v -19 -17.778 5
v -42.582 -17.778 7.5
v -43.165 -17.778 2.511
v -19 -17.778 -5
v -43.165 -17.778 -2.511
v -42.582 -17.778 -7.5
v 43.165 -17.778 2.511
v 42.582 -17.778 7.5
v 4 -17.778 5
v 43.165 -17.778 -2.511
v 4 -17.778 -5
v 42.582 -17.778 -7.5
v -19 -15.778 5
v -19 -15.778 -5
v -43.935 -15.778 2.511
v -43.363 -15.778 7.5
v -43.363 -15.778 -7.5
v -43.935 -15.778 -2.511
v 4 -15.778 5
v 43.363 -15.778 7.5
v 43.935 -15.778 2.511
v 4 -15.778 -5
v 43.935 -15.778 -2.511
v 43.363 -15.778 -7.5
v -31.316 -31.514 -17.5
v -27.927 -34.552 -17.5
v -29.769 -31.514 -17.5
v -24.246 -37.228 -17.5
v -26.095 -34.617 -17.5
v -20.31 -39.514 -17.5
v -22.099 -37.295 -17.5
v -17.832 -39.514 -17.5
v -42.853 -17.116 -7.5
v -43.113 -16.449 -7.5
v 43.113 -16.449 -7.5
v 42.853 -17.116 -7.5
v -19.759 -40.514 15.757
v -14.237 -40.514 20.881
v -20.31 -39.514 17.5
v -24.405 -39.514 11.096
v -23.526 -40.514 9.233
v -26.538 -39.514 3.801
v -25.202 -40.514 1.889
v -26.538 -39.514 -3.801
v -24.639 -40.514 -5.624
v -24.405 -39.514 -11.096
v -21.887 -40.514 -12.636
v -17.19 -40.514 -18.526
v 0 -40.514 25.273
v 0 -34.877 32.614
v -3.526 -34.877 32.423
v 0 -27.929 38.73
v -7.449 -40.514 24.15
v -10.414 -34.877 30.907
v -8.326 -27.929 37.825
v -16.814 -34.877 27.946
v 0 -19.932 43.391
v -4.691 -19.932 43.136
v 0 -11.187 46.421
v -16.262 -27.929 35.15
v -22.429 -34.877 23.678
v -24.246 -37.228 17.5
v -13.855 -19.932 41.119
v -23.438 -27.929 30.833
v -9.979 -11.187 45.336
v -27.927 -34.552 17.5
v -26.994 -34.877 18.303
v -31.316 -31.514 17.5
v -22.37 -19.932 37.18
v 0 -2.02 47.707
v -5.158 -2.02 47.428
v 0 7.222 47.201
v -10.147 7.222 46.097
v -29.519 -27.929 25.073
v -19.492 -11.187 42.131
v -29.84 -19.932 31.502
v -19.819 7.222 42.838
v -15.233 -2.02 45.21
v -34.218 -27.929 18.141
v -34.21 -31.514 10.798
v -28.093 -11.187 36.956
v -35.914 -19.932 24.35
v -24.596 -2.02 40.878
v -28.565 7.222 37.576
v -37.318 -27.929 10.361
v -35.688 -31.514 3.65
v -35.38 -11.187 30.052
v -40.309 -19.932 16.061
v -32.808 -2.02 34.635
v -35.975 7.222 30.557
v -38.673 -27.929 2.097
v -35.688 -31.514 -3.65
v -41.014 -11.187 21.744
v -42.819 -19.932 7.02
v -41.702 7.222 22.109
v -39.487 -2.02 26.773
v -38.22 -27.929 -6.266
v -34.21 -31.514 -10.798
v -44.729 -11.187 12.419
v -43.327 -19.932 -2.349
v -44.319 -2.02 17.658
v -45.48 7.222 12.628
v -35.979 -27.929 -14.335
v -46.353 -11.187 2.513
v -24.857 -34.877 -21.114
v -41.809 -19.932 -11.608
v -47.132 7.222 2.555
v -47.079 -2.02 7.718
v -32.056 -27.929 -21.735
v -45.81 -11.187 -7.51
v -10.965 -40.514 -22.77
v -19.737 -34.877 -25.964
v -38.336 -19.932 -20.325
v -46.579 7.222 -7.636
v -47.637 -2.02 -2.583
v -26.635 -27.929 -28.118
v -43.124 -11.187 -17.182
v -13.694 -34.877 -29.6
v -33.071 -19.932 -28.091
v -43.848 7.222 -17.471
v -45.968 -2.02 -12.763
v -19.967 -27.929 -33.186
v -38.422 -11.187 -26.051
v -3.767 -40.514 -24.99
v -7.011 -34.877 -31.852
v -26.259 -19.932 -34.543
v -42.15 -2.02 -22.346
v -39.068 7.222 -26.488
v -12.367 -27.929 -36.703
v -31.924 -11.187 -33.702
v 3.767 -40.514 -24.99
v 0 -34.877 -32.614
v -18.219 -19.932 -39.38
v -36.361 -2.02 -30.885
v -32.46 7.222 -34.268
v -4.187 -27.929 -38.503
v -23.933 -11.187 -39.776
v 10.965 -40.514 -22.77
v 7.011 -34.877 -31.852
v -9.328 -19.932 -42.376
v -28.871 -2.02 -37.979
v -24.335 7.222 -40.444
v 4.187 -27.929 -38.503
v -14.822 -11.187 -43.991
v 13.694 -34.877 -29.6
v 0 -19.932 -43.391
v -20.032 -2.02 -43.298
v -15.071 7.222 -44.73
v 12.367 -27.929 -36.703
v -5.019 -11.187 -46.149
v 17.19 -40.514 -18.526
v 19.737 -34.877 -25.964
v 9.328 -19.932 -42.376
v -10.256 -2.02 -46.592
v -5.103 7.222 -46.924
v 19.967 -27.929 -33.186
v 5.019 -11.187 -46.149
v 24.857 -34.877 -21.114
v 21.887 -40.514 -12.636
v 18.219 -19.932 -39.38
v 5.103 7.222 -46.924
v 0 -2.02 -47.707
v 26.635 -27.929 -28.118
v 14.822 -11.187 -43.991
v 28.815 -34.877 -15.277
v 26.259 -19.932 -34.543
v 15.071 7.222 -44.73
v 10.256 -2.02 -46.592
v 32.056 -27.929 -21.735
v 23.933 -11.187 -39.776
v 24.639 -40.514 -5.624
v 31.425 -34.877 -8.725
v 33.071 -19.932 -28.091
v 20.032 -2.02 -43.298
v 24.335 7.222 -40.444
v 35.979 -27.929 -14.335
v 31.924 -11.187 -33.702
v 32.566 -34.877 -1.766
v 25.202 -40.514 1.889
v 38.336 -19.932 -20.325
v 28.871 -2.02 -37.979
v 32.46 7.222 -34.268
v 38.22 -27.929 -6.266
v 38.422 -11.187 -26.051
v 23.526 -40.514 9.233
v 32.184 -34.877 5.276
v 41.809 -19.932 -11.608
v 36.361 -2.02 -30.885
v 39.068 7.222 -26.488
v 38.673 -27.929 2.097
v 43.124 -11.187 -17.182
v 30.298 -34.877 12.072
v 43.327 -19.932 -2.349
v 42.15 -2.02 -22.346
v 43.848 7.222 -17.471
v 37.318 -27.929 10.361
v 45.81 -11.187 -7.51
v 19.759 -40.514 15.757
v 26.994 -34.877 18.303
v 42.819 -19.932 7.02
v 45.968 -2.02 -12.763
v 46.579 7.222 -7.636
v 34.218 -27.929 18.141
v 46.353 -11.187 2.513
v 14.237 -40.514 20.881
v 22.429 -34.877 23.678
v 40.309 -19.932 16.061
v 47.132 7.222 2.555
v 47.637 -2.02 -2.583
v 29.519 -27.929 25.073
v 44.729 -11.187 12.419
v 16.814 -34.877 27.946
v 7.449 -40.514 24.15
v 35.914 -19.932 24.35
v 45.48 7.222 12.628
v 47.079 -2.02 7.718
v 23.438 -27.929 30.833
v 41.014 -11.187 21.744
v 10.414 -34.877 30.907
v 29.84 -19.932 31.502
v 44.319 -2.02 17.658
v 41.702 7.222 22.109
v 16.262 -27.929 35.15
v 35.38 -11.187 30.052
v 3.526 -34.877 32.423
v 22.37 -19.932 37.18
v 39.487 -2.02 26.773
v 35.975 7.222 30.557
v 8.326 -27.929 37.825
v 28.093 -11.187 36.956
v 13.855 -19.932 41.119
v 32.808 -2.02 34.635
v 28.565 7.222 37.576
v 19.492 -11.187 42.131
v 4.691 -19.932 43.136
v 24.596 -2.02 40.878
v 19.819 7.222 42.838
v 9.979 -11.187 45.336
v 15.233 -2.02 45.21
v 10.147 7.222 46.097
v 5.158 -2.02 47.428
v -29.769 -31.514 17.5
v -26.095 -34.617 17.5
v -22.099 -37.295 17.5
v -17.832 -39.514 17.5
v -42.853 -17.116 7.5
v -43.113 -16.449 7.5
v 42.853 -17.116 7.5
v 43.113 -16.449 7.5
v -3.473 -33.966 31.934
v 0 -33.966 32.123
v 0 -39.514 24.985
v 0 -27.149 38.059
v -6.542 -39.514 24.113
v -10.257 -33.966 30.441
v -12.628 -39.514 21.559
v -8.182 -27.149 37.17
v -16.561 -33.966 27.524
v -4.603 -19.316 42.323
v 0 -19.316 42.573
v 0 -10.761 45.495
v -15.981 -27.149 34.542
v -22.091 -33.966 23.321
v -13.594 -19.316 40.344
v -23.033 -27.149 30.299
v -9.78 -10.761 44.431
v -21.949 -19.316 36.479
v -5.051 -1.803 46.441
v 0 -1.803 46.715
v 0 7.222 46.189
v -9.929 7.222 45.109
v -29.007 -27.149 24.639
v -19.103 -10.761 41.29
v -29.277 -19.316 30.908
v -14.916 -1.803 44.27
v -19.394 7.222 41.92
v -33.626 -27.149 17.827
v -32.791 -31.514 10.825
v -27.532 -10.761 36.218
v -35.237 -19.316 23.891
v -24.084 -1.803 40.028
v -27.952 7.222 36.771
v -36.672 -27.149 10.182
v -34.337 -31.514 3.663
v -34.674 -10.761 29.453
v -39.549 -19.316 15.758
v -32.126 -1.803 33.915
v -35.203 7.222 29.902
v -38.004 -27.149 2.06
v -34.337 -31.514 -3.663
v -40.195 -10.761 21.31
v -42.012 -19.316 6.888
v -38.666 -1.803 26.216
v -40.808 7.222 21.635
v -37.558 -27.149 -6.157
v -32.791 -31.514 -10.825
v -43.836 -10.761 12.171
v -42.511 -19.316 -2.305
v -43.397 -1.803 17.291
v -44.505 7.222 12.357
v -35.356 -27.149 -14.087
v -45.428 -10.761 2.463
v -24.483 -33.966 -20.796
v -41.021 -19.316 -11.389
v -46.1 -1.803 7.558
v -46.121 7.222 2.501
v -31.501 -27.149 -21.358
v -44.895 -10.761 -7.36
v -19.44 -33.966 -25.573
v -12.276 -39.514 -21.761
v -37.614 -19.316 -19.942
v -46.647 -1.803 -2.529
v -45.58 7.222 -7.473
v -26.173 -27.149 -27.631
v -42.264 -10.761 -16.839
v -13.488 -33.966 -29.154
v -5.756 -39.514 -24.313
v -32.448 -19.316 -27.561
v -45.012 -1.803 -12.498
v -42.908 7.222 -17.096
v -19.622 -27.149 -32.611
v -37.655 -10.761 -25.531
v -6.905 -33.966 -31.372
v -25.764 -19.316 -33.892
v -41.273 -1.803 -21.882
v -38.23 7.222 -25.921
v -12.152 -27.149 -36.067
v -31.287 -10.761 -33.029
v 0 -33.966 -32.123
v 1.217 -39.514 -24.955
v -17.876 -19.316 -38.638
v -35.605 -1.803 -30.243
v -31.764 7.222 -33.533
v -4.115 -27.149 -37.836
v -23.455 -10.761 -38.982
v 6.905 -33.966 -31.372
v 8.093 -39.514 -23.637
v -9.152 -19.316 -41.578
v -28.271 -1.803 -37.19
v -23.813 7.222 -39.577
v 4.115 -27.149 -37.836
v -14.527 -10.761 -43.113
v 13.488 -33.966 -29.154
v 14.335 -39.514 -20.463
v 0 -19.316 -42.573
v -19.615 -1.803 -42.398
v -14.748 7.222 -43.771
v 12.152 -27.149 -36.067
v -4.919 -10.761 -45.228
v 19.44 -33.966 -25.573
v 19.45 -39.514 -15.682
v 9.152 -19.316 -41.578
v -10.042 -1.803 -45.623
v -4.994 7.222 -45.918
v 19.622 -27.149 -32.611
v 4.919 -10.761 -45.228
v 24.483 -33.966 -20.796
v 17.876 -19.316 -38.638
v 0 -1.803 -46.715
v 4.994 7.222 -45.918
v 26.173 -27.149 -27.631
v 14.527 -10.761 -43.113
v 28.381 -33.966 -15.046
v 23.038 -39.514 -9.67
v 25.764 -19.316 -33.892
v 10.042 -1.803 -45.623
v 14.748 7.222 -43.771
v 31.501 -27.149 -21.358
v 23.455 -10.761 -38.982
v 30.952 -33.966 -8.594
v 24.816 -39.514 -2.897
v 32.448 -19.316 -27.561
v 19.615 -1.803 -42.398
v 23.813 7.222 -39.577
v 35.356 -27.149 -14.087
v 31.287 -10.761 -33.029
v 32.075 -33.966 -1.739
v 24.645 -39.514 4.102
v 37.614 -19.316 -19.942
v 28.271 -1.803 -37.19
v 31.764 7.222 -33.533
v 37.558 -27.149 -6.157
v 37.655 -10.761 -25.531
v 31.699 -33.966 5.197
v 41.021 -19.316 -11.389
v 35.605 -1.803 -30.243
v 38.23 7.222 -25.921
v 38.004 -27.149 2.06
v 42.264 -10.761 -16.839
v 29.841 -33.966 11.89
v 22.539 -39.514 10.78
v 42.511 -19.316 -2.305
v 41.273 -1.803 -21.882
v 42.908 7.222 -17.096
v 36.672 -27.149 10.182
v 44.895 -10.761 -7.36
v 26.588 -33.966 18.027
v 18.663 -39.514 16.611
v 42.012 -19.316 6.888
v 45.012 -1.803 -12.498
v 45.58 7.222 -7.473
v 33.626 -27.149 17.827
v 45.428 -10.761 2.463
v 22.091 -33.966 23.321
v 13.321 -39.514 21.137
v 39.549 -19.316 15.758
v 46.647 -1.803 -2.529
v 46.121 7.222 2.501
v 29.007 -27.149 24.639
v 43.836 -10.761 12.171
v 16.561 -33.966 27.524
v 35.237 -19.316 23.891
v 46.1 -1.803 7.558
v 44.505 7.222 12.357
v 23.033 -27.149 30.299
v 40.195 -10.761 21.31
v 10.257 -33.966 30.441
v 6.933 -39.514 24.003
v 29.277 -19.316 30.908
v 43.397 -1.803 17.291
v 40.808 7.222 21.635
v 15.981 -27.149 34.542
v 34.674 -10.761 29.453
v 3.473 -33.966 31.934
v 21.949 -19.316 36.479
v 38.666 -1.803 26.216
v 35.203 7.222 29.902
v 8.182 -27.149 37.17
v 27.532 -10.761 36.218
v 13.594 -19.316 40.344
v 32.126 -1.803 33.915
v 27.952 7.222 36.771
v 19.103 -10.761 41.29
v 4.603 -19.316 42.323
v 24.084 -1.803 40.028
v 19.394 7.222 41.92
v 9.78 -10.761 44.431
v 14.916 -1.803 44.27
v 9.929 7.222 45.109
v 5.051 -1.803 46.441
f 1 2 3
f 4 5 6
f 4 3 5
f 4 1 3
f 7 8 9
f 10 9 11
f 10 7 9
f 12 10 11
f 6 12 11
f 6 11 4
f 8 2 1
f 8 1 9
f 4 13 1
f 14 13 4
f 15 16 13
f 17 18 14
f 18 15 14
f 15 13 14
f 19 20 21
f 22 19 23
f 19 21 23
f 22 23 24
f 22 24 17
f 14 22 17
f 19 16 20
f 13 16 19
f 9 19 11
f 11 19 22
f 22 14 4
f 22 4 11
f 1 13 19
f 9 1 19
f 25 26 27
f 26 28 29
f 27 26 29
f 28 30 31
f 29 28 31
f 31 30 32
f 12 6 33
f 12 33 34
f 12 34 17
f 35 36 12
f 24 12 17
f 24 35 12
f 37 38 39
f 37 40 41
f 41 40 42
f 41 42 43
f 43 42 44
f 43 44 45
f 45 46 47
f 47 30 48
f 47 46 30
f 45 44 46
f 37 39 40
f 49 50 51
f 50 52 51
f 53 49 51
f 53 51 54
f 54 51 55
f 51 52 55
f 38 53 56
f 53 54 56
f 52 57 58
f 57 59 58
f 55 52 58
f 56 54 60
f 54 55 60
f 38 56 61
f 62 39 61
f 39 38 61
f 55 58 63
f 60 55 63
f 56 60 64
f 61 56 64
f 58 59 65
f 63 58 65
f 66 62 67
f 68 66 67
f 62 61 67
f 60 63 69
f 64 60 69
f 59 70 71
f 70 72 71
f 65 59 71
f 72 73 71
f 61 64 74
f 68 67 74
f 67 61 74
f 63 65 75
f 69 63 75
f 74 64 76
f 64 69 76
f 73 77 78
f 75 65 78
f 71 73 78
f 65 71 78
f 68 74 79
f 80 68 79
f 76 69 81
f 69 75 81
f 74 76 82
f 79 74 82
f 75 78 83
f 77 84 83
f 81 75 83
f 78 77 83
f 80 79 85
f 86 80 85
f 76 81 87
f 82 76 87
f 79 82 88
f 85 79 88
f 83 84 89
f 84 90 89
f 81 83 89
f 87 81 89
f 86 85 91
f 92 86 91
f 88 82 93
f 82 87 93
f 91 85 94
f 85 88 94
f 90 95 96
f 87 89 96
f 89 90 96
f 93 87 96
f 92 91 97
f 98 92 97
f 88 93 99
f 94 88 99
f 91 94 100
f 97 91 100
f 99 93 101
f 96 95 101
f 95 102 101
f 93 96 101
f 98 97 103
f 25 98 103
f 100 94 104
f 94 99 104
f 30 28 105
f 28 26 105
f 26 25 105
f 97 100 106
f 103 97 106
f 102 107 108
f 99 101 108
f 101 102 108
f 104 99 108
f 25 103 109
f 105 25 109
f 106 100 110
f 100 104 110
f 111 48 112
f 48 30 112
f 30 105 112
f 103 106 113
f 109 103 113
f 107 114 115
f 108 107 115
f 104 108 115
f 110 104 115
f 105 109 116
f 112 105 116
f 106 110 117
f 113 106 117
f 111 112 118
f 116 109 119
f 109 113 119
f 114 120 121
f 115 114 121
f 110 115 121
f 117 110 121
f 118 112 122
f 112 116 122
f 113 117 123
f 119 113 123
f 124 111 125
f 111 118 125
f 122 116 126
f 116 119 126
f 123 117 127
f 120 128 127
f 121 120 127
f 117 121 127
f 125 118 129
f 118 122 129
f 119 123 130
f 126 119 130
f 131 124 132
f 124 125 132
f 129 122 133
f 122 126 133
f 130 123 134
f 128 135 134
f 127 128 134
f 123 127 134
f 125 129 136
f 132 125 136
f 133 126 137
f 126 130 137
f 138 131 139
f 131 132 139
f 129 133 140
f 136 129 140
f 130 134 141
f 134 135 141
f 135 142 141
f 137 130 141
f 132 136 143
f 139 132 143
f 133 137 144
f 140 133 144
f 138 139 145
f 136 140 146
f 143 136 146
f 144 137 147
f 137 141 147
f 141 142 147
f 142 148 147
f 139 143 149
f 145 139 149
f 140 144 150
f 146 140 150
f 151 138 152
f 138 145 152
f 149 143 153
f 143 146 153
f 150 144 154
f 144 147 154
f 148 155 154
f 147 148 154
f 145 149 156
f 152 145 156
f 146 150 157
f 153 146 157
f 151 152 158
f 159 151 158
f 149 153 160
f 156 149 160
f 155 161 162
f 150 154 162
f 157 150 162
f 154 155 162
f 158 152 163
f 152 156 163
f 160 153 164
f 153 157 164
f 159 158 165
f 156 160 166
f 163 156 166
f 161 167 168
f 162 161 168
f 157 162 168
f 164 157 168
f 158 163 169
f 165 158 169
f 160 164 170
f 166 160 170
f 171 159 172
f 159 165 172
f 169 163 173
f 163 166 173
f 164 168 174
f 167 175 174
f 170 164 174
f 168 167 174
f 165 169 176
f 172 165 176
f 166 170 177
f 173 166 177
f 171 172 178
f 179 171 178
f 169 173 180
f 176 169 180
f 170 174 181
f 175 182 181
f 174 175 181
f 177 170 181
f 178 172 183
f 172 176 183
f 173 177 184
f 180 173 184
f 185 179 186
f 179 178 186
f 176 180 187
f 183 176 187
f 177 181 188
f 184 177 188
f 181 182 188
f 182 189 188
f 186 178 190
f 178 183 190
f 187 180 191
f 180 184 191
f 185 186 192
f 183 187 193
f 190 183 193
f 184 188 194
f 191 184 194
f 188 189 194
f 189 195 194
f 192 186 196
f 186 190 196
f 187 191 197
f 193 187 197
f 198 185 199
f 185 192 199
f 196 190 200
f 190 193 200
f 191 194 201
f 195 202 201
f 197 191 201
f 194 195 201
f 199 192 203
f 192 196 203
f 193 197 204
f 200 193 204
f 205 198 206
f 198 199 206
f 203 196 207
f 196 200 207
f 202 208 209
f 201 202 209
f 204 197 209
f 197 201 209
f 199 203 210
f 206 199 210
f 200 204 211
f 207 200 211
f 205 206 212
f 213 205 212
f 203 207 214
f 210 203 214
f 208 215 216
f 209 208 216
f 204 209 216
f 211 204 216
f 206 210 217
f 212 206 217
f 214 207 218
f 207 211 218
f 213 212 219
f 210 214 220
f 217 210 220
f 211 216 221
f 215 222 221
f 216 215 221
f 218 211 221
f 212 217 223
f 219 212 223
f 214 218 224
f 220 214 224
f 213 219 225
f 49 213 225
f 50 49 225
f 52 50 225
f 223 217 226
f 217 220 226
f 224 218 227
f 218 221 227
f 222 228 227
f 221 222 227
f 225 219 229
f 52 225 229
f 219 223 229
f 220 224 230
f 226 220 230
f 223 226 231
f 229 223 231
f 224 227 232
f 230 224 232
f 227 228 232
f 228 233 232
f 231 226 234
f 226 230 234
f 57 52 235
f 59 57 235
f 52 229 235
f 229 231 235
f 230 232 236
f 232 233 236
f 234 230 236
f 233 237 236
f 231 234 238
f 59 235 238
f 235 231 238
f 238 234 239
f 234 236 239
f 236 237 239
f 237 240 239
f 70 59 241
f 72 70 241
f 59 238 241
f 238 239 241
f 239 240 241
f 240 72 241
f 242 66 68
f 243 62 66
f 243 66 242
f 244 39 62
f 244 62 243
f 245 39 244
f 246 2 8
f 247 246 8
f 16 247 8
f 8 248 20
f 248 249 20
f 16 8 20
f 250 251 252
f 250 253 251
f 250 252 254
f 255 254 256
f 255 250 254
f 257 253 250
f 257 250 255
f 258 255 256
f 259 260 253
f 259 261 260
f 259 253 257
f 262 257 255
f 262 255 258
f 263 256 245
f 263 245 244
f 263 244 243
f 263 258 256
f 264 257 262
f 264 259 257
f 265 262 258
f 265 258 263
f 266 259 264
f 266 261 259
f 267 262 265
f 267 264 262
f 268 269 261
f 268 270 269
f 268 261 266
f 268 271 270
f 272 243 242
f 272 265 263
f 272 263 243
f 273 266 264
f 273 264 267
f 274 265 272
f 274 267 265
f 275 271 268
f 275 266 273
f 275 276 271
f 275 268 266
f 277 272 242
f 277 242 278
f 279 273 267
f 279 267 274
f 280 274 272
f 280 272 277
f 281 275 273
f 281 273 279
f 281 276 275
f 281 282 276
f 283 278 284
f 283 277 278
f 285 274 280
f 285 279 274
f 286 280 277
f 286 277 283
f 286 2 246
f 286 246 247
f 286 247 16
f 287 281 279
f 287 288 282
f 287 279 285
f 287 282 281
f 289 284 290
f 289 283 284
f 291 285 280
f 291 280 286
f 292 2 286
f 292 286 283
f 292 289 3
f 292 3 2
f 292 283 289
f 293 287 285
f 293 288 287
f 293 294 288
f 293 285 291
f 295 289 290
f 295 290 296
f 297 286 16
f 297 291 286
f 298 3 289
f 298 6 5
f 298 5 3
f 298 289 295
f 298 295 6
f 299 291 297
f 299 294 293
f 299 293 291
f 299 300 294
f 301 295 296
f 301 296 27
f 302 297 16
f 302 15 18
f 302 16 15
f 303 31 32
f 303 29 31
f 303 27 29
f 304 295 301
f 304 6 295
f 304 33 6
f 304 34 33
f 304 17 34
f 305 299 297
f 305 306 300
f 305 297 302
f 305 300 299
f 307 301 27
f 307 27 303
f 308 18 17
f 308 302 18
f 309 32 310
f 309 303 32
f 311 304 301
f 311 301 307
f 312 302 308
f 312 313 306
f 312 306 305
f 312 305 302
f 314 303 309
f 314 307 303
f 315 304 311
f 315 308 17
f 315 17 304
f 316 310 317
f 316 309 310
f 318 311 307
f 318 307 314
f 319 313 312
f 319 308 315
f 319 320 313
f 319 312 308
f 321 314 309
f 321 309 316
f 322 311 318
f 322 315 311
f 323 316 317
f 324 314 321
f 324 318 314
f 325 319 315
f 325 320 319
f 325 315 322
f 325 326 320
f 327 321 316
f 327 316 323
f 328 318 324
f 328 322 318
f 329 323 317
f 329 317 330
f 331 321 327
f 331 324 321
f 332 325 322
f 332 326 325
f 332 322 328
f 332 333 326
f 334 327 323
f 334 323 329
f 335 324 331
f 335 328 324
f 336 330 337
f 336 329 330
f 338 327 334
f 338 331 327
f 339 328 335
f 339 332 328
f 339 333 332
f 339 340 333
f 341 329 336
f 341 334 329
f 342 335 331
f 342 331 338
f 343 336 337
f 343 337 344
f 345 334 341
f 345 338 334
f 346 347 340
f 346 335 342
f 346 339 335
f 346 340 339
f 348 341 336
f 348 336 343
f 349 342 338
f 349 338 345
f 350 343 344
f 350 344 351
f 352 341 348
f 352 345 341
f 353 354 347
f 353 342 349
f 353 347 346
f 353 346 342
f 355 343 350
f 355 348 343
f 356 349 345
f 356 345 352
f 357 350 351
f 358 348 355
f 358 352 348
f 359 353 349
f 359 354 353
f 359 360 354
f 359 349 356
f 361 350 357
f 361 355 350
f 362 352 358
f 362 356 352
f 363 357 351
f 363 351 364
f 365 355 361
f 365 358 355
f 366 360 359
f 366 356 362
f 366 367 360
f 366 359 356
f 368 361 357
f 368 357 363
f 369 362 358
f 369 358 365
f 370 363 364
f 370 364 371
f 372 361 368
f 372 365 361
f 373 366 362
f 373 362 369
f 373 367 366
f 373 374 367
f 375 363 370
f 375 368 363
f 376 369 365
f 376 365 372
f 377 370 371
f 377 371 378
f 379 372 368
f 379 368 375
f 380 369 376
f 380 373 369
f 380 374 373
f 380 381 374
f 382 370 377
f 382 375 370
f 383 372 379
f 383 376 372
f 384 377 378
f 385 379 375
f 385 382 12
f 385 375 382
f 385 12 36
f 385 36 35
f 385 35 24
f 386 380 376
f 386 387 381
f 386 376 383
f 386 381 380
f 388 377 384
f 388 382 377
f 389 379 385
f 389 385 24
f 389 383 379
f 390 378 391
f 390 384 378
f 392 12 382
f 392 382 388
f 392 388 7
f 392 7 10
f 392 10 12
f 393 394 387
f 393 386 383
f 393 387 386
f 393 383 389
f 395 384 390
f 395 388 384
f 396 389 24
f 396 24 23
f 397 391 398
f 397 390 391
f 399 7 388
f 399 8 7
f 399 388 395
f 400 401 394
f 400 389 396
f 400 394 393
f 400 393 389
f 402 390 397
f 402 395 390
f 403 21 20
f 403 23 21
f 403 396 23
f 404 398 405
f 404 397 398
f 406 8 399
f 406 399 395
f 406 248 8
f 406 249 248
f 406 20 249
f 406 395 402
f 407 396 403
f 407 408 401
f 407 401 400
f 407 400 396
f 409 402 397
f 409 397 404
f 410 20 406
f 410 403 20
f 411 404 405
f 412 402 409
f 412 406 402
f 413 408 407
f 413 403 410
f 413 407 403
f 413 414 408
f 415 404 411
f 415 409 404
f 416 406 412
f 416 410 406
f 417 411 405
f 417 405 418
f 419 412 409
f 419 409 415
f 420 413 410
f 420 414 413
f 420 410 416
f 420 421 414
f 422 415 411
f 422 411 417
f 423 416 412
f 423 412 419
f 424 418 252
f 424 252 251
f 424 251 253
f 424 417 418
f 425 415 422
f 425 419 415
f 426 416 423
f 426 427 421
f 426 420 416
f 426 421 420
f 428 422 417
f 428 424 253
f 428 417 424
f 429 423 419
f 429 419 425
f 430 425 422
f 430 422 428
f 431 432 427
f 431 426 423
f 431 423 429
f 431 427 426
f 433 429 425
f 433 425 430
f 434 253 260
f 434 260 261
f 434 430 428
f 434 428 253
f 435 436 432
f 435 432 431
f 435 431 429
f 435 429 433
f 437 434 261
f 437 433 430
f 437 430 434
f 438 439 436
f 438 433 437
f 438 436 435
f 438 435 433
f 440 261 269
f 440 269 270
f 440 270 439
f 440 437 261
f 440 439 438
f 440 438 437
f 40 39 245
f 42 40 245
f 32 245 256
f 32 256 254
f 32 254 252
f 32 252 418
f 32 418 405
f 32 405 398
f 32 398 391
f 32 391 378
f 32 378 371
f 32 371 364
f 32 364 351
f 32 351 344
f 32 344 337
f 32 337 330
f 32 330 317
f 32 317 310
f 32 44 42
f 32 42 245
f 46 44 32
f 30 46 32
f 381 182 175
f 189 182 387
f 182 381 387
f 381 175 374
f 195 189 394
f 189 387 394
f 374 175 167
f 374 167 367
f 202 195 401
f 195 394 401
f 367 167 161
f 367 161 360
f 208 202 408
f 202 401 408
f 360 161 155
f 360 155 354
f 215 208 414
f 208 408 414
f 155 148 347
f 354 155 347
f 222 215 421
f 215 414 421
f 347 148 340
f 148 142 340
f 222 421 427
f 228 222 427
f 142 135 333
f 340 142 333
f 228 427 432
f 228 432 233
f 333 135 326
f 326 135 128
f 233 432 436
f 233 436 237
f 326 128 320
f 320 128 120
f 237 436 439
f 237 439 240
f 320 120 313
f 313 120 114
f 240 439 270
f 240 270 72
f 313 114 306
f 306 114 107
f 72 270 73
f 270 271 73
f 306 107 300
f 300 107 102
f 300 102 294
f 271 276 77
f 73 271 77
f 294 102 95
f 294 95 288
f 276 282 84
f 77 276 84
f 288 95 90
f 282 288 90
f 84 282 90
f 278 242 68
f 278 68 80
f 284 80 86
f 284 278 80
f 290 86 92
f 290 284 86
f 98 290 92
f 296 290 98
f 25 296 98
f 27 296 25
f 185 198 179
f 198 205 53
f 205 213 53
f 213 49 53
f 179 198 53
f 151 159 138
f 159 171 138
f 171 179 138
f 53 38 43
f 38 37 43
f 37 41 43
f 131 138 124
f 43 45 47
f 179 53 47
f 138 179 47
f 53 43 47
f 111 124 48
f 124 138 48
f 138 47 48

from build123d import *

# Parameters (mm, degrees)
SHELL_1_T            = -1
EXTRUDE_1_REACH      = 80.75
EXTRUDE_1_END_RADIUS = 46.75
SKETCH_2_W           = 15
SKETCH_2_H           = 2
EXTRUDE_2_REACH      = 80.75
SKETCH_4_W           = 15
SKETCH_4_H           = 2
SKETCH_5_W           = 23
SKETCH_5_H           = 10
CUT_EXTRUDE_1_DEPTH  = 10
SKETCH_6_W           = 35
SKETCH_6_H           = 8
CUT_EXTRUDE_2_DEPTH  = 47


with BuildPart() as part:
    # 草图1 → 旋转1 (revolve)
    with BuildSketch(Plane(origin=(0, 0, 0), x_dir=(0, 0, -1), z_dir=(1, 0, 0))):
        with BuildLine():
            Line((-47.200739576, 7.221681487), (0, 7.221681487))
            Line((0, 7.221681487), (0, -40.513710474))
            Line((0, -40.513710474), (-25.272549608, -40.513710474))
            ThreePointArc((-25.272549608, -40.513710474), (-43.390797673, -19.932415241), (-47.200739576, 7.221681487))
        make_face()
    revolve(axis=Axis((0, 7.221681487, 0), (0, -1, 0)))

    # 抽壳1
    shell_1_openings = [part.faces().sort_by_distance(p)[0] for p in [
        (0, 7.221681487, 0),
    ]]
    offset(amount=SHELL_1_T, openings=shell_1_openings, kind=Kind.INTERSECTION)

    # 凸台-拉伸1: up to this sphere (the profile starts inside it)
    extrude_1_end = Location((0, 0, 0)) * Sphere(EXTRUDE_1_END_RADIUS, mode=Mode.PRIVATE)
    # 草图2 → 凸台-拉伸1 (add, up to the surface)
    with BuildSketch(Plane(origin=(0, 0, 0), x_dir=(0, 0, -1), z_dir=(1, 0, 0)), mode=Mode.PRIVATE) as extrude_1_sk1:
        with Locations((0, -16.778318513)):
            Rectangle(SKETCH_2_W, SKETCH_2_H)
    extrude_1_tool1 = extrude(extrude_1_sk1.sketch, amount=EXTRUDE_1_REACH, mode=Mode.PRIVATE) & extrude_1_end
    add(extrude_1_tool1.solids().sort_by_distance((0, -16.778319, 0))[0])

    # 草图4 → 凸台-拉伸2 (add, up to next)
    with BuildSketch(Plane(origin=(0, 0, 0), x_dir=(0, 0, -1), z_dir=(1, 0, 0)), mode=Mode.PRIVATE) as extrude_2_sk1:
        with Locations((0, -16.778318513)):
            Rectangle(SKETCH_4_W, SKETCH_4_H)
    extrude_2_tool1 = extrude(extrude_2_sk1.sketch, amount=-EXTRUDE_2_REACH, mode=Mode.PRIVATE) - part.part
    add(extrude_2_tool1.solids().sort_by_distance((0, -16.778319, 0))[0])

    # 草图5 → 切除-拉伸1 (cut)
    with BuildSketch(Plane(origin=(0, -15.778318513, 0), x_dir=(1, 0, 0), z_dir=(0, 1, 0))):
        with Locations((-7.5, 0)):
            Rectangle(SKETCH_5_W, SKETCH_5_H)
    extrude(amount=-CUT_EXTRUDE_1_DEPTH, mode=Mode.SUBTRACT)

    # 草图6 → 切除-拉伸2 (cut)
    with BuildSketch(Plane(origin=(0, 0, 0), x_dir=(0, 0, -1), z_dir=(1, 0, 0))):
        with Locations((0, -35.513710474)):
            Rectangle(SKETCH_6_W, SKETCH_6_H)
    extrude(amount=-CUT_EXTRUDE_2_DEPTH, mode=Mode.SUBTRACT)


solid = part.part
